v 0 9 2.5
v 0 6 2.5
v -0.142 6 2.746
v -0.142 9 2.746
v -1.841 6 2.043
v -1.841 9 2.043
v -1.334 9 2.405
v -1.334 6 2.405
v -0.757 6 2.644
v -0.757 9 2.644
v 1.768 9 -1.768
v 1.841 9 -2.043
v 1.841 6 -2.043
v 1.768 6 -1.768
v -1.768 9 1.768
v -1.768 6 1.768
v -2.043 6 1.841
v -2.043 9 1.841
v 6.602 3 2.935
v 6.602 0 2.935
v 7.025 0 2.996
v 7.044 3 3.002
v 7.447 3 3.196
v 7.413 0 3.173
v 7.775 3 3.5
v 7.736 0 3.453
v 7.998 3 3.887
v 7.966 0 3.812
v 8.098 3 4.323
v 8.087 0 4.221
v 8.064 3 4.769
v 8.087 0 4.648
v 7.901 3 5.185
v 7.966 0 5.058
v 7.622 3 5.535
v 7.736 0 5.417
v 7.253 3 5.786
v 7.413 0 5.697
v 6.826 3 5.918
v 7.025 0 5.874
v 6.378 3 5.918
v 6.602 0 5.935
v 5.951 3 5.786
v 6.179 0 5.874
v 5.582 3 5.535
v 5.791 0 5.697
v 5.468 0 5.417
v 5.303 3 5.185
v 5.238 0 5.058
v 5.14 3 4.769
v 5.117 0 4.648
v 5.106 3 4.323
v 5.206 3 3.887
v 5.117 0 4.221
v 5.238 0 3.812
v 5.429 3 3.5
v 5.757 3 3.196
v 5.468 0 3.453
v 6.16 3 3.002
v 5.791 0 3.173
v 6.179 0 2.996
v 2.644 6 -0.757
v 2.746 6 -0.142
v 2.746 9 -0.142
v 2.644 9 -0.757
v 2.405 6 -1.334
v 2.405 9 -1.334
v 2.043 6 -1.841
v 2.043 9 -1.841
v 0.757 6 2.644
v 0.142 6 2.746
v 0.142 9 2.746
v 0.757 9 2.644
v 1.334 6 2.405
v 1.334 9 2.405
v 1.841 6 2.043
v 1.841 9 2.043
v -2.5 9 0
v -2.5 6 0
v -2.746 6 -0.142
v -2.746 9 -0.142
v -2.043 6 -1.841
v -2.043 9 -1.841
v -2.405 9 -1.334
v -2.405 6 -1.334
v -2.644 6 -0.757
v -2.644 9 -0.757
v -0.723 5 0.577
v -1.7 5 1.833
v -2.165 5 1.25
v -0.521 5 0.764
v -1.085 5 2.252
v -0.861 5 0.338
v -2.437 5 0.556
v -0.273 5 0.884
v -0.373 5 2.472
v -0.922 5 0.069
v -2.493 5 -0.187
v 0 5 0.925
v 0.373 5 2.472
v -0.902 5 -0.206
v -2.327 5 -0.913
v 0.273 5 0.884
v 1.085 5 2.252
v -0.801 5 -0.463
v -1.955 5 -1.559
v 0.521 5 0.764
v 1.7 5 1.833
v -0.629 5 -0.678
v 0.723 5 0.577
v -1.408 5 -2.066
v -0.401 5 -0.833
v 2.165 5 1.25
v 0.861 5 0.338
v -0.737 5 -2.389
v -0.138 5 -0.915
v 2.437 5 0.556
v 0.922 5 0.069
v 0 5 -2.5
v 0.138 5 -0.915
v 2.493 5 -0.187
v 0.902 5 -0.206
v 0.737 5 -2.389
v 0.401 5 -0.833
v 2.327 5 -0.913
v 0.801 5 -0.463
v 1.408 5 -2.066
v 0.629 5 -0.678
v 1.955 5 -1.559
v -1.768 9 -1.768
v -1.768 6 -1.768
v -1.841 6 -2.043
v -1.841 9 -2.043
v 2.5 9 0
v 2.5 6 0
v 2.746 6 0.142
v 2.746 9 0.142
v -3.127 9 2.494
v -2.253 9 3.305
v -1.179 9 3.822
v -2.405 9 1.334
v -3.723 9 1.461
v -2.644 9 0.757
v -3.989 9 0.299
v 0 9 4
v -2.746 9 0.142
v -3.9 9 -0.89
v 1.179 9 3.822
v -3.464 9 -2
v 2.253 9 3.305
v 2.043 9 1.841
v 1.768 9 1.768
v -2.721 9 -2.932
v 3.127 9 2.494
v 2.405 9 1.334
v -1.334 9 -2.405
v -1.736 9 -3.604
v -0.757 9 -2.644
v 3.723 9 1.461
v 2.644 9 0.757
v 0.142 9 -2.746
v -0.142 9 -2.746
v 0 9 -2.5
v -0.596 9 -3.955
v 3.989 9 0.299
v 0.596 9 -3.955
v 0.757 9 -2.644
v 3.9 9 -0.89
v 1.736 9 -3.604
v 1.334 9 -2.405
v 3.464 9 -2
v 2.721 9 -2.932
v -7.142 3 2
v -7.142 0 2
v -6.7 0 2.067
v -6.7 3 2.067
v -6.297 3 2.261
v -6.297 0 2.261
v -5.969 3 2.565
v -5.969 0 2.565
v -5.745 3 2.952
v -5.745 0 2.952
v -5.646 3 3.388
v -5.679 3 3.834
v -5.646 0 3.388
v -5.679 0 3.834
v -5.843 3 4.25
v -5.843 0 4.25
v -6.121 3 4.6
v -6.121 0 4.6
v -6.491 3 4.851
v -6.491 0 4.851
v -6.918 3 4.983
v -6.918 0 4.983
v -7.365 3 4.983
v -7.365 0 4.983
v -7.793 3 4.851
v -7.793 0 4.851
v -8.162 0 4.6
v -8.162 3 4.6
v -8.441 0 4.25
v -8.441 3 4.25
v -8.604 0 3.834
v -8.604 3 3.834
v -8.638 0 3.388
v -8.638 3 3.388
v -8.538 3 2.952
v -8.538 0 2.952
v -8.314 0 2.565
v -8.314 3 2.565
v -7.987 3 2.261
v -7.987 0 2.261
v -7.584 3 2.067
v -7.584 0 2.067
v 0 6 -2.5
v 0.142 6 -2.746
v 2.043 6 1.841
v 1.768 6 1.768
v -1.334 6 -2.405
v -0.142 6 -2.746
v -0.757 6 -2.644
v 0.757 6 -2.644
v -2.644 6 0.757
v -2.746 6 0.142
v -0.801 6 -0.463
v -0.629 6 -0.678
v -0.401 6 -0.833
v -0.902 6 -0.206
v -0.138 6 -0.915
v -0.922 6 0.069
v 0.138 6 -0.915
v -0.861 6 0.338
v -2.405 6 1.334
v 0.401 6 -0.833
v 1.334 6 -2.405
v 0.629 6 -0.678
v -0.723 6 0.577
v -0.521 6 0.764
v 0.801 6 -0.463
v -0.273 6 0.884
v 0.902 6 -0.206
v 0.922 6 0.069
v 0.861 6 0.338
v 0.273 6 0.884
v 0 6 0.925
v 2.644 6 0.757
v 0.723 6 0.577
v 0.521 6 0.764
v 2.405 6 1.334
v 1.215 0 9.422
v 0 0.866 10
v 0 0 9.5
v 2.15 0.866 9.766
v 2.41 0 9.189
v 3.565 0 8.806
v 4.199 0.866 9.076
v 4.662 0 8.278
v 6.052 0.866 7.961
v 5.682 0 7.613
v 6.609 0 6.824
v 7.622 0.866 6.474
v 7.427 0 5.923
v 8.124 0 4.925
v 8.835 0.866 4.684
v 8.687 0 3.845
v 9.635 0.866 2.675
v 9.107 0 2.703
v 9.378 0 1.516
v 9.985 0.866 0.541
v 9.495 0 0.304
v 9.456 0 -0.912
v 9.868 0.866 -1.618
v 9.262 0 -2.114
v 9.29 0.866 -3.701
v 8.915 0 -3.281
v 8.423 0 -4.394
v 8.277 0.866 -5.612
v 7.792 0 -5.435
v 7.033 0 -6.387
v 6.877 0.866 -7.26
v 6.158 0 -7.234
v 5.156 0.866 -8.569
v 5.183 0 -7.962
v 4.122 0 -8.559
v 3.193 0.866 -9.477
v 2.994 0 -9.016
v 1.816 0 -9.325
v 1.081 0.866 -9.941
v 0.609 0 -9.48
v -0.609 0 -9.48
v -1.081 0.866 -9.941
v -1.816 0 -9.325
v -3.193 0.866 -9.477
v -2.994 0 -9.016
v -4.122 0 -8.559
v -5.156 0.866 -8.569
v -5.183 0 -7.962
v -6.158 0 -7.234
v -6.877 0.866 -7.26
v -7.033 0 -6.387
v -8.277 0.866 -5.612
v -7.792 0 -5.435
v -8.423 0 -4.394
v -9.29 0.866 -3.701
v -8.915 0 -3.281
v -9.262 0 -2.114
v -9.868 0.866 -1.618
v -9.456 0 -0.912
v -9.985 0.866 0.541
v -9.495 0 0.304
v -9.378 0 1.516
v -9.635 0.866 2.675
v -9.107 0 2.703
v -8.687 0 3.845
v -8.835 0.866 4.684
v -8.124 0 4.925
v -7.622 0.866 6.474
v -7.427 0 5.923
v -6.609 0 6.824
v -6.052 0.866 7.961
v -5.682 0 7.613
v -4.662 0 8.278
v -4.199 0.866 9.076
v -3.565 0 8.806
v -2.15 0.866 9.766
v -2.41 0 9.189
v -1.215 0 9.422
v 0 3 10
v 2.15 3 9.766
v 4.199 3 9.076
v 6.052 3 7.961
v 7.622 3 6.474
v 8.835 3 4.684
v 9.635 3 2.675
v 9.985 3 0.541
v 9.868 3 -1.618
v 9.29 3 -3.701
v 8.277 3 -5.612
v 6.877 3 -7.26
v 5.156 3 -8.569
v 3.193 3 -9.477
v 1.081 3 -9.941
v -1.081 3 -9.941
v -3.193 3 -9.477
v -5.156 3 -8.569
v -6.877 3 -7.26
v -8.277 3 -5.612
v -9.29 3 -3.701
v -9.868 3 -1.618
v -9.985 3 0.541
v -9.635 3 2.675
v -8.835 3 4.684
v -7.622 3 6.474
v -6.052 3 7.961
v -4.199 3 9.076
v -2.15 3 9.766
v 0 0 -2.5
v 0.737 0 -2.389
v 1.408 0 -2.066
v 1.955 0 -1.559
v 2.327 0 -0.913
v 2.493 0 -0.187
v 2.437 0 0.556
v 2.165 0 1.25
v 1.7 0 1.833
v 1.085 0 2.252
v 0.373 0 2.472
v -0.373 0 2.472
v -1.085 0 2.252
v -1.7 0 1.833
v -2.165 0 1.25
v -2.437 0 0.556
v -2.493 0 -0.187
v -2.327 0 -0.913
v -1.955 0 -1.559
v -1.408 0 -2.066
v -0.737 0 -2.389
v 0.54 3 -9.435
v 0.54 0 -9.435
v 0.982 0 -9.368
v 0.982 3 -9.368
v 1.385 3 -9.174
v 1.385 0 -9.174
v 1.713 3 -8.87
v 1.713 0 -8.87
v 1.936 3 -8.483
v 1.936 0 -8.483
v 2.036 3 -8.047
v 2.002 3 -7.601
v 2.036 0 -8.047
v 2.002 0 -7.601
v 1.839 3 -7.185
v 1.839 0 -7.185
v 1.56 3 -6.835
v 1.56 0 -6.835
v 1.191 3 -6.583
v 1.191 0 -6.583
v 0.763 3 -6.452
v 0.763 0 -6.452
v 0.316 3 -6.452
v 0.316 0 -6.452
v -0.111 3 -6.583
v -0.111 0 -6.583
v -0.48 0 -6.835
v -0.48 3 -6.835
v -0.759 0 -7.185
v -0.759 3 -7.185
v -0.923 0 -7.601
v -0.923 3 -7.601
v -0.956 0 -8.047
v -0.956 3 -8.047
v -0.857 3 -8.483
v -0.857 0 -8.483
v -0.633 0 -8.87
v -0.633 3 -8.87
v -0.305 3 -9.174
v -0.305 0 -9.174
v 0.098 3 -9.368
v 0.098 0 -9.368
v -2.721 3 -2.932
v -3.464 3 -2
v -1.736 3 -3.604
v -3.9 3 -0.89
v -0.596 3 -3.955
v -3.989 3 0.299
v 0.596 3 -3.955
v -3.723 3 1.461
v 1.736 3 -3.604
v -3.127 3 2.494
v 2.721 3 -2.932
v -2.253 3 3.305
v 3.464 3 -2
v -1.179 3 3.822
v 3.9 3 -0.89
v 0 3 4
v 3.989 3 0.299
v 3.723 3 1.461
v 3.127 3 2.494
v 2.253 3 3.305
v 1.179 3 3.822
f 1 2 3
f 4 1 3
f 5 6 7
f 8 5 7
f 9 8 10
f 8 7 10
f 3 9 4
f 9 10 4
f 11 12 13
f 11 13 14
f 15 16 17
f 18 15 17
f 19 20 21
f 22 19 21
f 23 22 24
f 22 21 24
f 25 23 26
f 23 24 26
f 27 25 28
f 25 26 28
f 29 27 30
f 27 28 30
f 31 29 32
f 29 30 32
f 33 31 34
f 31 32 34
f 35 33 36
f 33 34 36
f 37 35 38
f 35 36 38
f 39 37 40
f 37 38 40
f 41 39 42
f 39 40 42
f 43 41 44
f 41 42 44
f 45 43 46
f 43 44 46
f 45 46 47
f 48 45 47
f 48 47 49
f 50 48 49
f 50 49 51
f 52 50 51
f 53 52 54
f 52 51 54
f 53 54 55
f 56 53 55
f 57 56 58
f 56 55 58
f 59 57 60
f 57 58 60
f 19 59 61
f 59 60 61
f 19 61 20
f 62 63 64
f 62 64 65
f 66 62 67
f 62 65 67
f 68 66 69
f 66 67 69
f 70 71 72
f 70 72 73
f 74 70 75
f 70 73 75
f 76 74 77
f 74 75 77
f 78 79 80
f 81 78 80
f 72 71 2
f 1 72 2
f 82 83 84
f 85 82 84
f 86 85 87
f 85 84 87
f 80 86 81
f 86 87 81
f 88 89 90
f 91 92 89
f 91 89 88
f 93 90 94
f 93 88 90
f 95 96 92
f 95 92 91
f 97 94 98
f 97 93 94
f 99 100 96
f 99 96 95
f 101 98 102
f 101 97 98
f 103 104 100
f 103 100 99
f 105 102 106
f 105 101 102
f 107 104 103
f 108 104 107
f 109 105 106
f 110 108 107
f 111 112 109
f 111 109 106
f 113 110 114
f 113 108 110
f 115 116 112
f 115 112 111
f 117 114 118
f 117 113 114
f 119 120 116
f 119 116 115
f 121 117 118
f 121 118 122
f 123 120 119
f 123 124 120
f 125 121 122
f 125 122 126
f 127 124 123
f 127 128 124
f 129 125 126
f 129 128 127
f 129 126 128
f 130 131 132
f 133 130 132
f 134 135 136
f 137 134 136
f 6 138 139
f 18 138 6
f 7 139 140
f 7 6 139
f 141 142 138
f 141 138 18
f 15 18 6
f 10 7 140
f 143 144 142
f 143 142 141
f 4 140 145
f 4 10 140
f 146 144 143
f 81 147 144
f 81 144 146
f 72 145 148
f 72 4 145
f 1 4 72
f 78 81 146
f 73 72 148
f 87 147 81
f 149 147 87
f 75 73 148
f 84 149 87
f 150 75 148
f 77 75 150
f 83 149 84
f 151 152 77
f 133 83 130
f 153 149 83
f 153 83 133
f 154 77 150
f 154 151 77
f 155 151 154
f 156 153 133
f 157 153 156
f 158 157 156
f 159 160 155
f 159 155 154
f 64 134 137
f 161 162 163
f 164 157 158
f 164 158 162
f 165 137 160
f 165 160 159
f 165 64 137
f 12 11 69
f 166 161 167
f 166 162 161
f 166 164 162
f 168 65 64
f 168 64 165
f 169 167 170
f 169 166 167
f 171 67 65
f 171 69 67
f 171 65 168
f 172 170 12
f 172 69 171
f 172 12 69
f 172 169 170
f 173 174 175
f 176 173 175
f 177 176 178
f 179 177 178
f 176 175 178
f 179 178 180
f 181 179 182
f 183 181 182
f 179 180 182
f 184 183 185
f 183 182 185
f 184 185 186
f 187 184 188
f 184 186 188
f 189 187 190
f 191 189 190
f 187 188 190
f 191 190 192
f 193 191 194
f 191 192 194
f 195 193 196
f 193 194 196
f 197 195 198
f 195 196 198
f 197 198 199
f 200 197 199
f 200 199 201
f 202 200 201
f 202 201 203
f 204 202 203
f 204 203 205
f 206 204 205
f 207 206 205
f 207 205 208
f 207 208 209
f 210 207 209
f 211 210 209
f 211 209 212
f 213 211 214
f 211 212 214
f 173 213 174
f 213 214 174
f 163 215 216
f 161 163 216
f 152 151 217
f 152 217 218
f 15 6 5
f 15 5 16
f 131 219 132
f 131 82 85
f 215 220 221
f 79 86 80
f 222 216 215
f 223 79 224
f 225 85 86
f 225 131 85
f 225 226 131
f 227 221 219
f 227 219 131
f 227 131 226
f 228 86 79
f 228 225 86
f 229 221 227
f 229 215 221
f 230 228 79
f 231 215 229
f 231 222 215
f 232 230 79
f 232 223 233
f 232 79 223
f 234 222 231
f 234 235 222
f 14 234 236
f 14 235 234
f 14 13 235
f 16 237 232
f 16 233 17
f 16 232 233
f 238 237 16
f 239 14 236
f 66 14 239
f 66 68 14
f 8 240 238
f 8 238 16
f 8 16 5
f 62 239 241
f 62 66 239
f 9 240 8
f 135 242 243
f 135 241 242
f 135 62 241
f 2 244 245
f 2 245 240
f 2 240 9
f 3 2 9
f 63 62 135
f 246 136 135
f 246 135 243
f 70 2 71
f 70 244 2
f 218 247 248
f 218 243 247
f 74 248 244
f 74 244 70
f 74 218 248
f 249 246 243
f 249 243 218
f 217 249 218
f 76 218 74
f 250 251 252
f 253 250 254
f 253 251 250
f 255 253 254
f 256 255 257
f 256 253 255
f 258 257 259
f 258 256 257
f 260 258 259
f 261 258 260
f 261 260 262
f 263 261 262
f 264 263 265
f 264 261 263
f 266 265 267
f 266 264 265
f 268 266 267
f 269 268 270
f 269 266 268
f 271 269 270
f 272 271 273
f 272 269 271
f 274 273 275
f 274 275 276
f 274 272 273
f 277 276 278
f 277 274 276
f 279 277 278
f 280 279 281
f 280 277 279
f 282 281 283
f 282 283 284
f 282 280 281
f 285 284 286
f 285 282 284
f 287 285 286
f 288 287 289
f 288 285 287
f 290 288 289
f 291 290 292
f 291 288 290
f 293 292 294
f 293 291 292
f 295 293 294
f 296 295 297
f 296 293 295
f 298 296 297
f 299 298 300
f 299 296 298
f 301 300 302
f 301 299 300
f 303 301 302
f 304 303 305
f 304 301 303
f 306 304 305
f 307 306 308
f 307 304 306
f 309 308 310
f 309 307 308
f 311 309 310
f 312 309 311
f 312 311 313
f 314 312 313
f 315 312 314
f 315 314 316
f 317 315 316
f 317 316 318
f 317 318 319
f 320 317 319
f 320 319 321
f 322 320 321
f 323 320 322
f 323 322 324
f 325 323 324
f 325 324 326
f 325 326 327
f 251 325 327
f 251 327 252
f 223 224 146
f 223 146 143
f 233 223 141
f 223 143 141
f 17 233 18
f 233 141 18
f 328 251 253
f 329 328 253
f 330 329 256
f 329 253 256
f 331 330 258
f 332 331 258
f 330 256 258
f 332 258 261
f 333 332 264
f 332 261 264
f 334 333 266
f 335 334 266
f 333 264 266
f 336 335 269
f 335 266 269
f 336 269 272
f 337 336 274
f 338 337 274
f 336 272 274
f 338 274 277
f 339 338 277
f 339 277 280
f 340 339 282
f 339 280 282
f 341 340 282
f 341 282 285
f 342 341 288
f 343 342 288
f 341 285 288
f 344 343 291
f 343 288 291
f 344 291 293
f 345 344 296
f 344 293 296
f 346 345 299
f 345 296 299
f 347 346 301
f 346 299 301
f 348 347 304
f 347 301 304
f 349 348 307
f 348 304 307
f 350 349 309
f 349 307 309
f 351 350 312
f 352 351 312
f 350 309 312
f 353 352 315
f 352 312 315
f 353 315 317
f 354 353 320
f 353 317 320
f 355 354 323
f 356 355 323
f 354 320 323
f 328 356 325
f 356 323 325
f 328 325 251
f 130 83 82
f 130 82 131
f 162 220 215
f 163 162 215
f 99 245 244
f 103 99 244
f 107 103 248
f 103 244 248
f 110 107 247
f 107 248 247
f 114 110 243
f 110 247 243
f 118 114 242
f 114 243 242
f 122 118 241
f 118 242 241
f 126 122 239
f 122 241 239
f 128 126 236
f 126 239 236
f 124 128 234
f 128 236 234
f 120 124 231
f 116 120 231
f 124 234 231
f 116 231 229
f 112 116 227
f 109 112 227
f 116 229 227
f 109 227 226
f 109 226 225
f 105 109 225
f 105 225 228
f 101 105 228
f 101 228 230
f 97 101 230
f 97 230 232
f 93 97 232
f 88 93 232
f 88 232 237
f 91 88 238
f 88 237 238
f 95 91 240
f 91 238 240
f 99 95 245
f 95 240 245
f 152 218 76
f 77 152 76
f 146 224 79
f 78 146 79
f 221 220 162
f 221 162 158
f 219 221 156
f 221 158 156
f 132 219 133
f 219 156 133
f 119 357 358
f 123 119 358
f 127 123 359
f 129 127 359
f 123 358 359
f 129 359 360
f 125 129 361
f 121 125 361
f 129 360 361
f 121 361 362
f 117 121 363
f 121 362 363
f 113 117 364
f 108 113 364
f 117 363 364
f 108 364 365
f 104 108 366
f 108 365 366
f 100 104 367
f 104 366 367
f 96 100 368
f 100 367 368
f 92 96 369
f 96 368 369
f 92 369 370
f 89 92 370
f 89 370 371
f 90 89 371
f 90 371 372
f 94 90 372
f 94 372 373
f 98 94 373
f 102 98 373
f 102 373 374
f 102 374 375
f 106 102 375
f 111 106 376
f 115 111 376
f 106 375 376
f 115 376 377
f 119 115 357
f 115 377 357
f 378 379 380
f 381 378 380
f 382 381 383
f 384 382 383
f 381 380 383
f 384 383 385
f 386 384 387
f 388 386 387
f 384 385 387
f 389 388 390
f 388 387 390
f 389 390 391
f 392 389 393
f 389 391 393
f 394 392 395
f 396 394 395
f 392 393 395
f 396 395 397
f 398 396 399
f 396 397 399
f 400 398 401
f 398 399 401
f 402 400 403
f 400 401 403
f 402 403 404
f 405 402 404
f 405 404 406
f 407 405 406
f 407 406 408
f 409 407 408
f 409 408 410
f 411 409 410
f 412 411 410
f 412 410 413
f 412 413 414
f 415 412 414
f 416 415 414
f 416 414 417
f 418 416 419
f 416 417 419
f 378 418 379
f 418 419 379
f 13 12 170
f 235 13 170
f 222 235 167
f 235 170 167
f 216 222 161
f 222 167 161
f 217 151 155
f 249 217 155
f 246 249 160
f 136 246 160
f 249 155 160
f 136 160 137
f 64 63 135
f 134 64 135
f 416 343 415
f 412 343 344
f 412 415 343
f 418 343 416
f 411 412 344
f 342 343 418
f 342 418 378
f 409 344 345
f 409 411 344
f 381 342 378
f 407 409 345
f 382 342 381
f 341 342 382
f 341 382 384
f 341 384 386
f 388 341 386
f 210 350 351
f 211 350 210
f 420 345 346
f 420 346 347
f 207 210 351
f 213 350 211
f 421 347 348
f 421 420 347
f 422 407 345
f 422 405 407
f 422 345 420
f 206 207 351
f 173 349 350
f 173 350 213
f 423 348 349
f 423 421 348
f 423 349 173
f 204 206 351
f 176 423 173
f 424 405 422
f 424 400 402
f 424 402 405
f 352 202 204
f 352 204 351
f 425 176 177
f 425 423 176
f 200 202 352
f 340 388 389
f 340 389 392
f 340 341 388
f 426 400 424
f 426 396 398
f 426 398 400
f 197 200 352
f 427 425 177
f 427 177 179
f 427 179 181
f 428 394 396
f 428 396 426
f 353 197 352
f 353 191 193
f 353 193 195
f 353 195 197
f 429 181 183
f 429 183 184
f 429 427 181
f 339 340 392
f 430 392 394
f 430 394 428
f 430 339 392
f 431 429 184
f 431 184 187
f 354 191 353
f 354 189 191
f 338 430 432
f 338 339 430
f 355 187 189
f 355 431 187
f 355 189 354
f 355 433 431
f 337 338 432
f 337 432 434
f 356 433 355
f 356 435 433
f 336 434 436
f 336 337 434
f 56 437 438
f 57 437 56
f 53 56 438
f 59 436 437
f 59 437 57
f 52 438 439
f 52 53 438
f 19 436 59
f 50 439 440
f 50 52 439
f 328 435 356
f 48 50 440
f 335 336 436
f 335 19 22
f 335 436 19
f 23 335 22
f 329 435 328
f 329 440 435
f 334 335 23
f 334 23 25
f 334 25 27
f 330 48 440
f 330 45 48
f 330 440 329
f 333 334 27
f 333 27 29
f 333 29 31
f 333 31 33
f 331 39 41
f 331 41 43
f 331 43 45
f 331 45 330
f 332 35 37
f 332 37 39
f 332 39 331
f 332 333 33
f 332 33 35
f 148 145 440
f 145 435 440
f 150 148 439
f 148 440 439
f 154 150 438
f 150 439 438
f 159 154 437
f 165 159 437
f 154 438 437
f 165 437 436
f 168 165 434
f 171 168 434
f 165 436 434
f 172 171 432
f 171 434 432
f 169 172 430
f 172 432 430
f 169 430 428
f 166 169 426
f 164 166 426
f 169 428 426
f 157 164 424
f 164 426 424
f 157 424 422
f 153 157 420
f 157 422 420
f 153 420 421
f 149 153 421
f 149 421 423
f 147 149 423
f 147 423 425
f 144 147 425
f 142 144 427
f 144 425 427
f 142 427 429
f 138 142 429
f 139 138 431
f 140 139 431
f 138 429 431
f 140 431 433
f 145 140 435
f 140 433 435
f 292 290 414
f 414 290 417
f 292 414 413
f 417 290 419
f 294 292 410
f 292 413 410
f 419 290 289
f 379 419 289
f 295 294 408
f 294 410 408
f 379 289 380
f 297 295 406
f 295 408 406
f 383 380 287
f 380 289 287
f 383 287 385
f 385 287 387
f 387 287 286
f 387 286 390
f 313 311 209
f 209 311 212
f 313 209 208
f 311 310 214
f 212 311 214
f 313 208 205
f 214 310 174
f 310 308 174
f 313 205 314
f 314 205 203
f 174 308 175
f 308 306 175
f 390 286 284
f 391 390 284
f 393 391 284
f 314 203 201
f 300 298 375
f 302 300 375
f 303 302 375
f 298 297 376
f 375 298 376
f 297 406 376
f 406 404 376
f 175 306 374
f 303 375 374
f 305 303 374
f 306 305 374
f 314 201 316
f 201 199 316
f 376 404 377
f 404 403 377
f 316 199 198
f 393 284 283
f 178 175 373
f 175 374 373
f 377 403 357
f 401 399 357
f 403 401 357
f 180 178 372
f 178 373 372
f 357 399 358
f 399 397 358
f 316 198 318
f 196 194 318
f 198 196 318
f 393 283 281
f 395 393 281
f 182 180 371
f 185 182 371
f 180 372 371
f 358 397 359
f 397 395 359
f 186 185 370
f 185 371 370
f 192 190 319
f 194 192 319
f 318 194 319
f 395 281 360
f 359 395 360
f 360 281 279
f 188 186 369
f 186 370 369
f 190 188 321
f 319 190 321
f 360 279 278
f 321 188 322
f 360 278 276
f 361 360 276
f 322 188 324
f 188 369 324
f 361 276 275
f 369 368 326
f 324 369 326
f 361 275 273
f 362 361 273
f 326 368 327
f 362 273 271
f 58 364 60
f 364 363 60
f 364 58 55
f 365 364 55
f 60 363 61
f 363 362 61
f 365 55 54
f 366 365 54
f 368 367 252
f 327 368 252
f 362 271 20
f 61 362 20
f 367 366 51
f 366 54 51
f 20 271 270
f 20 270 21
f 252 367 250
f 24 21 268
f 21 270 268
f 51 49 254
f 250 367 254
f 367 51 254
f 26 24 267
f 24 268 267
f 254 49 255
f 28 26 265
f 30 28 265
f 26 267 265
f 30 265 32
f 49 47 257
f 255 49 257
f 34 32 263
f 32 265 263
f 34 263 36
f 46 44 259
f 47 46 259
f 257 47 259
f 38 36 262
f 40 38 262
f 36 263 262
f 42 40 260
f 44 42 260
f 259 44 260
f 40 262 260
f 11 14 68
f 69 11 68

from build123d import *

# Parameters (mm, degrees)
SKETCH1_R           = 10
BOSS_EXTRUDE1_DEPTH = 3
SKETCH2_R           = 4
BOSS_EXTRUDE2_DEPTH = 3
SKETCH3_R           = 2.5
CUT_EXTRUDE1_DEPTH  = 5
SKETCH4_R           = 1.5
CUT_EXTRUDE2_DEPTH  = 3
SKETCH5_R           = 0.925
CUT_EXTRUDE3_DEPTH  = 1
CHAMFER1_SIZE       = 0.5
CHAMFER1_SIZE2      = 0.866025404
SKETCH6_R           = 4
BOSS_EXTRUDE3_DEPTH = 3
SKETCH7_R           = 2.75
CUT_EXTRUDE4_DEPTH  = 3
BOSS_EXTRUDE6_DEPTH = 3


with BuildPart() as part:
    # Sketch1 → Boss-Extrude1 (new body)
    with BuildSketch(Plane(origin=(0, 0, 0), x_dir=(1, 0, 0), z_dir=(0, 1, 0))):
        with Locations(Location((0, 0, 0), (0, 0, 270))):
            Circle(SKETCH1_R)
    extrude(amount=BOSS_EXTRUDE1_DEPTH)

    # Sketch2 → Boss-Extrude2 (add)
    with BuildSketch(Plane(origin=(0, 3, 0), x_dir=(1, 0, 0), z_dir=(0, 1, 0))):
        with Locations(Location((0, 0, 0), (0, 0, 270))):
            Circle(SKETCH2_R)
    extrude(amount=BOSS_EXTRUDE2_DEPTH)

    # Sketch3 → Cut-Extrude1 (cut)
    with BuildSketch(Plane.XZ):
        with Locations(Location((0, 0, 0), (0, 0, 270))):
            Circle(SKETCH3_R)
    extrude(amount=-CUT_EXTRUDE1_DEPTH, mode=Mode.SUBTRACT)

    # Sketch4 → Cut-Extrude2 (cut)
    with BuildSketch(Plane.XZ):
        with Locations(Location((-7.141738564, 3.5, 0), (0, 0, 270))):
            Circle(SKETCH4_R)
        with Locations(Location((6.601958195, 4.434927024, 0), (0, 0, 270))):
            Circle(SKETCH4_R)
        with Locations(Location((0.539780369, -7.934927024, 0), (0, 0, 270))):
            Circle(SKETCH4_R)
    extrude(amount=-CUT_EXTRUDE2_DEPTH, mode=Mode.SUBTRACT)

    # Sketch5 → Cut-Extrude3 (cut)
    with BuildSketch(Plane(origin=(0, 6, 0), x_dir=(1, 0, 0), z_dir=(0, 1, 0))):
        with Locations(Location((0, 0, 0), (0, 0, 270))):
            Circle(SKETCH5_R)
    extrude(amount=-CUT_EXTRUDE3_DEPTH, mode=Mode.SUBTRACT)

    # Chamfer1
    chamfer1_edges = [part.edges().sort_by_distance(p)[0] for p in [
        (0, 0, -10),
    ]]
    chamfer1_side = [part.faces().sort_by_distance(p)[0] for p in [
        (0, 0, -9.717157288),
    ]]
    chamfer(chamfer1_edges, length=CHAMFER1_SIZE, length2=CHAMFER1_SIZE2, reference=chamfer1_side[0])

    # Sketch6 → Boss-Extrude3 (add)
    with BuildSketch(Plane(origin=(0, 6, 0), x_dir=(1, 0, 0), z_dir=(0, 1, 0))):
        with Locations(Location((0, 0, 0), (0, 0, 270))):
            Circle(SKETCH6_R)
    extrude(amount=BOSS_EXTRUDE3_DEPTH)

    # Sketch7 → Cut-Extrude4 (cut)
    with BuildSketch(Plane(origin=(0, 9, 0), x_dir=(1, 0, 0), z_dir=(0, 1, 0))):
        with Locations(Location((0, 0, 0), (0, 0, 270))):
            Circle(SKETCH7_R)
    extrude(amount=-CUT_EXTRUDE4_DEPTH, mode=Mode.SUBTRACT)

    # Sketch8 → Boss-Extrude6 (add)
    with BuildSketch(Plane(origin=(0, 6, 0), x_dir=(1, 0, 0), z_dir=(0, 1, 0))):
        Polygon((0, 2.5), (0.216506351, 2.875), (-0.216506351, 2.875), align=None)
        Polygon((1.767766953, 1.767766953), (2.186025105, 1.879838887), (1.879838887, 2.186025105), align=None)
        Polygon((2.5, 0), (2.875, -0.216506351), (2.875, 0.216506351), align=None)
        Polygon((1.767766953, -1.767766953), (1.879838887, -2.186025105), (2.186025105, -1.879838887), align=None)
        Polygon((0, -2.5), (-0.216506351, -2.875), (0.216506351, -2.875), align=None)
        Polygon((-1.767766953, -1.767766953), (-2.186025105, -1.879838887), (-1.879838887, -2.186025105), align=None)
        Polygon((-2.5, 0), (-2.875, 0.216506351), (-2.875, -0.216506351), align=None)
        Polygon((-1.767766953, 1.767766953), (-1.879838887, 2.186025105), (-2.186025105, 1.879838887), align=None)
    extrude(amount=BOSS_EXTRUDE6_DEPTH)


solid = part.part
